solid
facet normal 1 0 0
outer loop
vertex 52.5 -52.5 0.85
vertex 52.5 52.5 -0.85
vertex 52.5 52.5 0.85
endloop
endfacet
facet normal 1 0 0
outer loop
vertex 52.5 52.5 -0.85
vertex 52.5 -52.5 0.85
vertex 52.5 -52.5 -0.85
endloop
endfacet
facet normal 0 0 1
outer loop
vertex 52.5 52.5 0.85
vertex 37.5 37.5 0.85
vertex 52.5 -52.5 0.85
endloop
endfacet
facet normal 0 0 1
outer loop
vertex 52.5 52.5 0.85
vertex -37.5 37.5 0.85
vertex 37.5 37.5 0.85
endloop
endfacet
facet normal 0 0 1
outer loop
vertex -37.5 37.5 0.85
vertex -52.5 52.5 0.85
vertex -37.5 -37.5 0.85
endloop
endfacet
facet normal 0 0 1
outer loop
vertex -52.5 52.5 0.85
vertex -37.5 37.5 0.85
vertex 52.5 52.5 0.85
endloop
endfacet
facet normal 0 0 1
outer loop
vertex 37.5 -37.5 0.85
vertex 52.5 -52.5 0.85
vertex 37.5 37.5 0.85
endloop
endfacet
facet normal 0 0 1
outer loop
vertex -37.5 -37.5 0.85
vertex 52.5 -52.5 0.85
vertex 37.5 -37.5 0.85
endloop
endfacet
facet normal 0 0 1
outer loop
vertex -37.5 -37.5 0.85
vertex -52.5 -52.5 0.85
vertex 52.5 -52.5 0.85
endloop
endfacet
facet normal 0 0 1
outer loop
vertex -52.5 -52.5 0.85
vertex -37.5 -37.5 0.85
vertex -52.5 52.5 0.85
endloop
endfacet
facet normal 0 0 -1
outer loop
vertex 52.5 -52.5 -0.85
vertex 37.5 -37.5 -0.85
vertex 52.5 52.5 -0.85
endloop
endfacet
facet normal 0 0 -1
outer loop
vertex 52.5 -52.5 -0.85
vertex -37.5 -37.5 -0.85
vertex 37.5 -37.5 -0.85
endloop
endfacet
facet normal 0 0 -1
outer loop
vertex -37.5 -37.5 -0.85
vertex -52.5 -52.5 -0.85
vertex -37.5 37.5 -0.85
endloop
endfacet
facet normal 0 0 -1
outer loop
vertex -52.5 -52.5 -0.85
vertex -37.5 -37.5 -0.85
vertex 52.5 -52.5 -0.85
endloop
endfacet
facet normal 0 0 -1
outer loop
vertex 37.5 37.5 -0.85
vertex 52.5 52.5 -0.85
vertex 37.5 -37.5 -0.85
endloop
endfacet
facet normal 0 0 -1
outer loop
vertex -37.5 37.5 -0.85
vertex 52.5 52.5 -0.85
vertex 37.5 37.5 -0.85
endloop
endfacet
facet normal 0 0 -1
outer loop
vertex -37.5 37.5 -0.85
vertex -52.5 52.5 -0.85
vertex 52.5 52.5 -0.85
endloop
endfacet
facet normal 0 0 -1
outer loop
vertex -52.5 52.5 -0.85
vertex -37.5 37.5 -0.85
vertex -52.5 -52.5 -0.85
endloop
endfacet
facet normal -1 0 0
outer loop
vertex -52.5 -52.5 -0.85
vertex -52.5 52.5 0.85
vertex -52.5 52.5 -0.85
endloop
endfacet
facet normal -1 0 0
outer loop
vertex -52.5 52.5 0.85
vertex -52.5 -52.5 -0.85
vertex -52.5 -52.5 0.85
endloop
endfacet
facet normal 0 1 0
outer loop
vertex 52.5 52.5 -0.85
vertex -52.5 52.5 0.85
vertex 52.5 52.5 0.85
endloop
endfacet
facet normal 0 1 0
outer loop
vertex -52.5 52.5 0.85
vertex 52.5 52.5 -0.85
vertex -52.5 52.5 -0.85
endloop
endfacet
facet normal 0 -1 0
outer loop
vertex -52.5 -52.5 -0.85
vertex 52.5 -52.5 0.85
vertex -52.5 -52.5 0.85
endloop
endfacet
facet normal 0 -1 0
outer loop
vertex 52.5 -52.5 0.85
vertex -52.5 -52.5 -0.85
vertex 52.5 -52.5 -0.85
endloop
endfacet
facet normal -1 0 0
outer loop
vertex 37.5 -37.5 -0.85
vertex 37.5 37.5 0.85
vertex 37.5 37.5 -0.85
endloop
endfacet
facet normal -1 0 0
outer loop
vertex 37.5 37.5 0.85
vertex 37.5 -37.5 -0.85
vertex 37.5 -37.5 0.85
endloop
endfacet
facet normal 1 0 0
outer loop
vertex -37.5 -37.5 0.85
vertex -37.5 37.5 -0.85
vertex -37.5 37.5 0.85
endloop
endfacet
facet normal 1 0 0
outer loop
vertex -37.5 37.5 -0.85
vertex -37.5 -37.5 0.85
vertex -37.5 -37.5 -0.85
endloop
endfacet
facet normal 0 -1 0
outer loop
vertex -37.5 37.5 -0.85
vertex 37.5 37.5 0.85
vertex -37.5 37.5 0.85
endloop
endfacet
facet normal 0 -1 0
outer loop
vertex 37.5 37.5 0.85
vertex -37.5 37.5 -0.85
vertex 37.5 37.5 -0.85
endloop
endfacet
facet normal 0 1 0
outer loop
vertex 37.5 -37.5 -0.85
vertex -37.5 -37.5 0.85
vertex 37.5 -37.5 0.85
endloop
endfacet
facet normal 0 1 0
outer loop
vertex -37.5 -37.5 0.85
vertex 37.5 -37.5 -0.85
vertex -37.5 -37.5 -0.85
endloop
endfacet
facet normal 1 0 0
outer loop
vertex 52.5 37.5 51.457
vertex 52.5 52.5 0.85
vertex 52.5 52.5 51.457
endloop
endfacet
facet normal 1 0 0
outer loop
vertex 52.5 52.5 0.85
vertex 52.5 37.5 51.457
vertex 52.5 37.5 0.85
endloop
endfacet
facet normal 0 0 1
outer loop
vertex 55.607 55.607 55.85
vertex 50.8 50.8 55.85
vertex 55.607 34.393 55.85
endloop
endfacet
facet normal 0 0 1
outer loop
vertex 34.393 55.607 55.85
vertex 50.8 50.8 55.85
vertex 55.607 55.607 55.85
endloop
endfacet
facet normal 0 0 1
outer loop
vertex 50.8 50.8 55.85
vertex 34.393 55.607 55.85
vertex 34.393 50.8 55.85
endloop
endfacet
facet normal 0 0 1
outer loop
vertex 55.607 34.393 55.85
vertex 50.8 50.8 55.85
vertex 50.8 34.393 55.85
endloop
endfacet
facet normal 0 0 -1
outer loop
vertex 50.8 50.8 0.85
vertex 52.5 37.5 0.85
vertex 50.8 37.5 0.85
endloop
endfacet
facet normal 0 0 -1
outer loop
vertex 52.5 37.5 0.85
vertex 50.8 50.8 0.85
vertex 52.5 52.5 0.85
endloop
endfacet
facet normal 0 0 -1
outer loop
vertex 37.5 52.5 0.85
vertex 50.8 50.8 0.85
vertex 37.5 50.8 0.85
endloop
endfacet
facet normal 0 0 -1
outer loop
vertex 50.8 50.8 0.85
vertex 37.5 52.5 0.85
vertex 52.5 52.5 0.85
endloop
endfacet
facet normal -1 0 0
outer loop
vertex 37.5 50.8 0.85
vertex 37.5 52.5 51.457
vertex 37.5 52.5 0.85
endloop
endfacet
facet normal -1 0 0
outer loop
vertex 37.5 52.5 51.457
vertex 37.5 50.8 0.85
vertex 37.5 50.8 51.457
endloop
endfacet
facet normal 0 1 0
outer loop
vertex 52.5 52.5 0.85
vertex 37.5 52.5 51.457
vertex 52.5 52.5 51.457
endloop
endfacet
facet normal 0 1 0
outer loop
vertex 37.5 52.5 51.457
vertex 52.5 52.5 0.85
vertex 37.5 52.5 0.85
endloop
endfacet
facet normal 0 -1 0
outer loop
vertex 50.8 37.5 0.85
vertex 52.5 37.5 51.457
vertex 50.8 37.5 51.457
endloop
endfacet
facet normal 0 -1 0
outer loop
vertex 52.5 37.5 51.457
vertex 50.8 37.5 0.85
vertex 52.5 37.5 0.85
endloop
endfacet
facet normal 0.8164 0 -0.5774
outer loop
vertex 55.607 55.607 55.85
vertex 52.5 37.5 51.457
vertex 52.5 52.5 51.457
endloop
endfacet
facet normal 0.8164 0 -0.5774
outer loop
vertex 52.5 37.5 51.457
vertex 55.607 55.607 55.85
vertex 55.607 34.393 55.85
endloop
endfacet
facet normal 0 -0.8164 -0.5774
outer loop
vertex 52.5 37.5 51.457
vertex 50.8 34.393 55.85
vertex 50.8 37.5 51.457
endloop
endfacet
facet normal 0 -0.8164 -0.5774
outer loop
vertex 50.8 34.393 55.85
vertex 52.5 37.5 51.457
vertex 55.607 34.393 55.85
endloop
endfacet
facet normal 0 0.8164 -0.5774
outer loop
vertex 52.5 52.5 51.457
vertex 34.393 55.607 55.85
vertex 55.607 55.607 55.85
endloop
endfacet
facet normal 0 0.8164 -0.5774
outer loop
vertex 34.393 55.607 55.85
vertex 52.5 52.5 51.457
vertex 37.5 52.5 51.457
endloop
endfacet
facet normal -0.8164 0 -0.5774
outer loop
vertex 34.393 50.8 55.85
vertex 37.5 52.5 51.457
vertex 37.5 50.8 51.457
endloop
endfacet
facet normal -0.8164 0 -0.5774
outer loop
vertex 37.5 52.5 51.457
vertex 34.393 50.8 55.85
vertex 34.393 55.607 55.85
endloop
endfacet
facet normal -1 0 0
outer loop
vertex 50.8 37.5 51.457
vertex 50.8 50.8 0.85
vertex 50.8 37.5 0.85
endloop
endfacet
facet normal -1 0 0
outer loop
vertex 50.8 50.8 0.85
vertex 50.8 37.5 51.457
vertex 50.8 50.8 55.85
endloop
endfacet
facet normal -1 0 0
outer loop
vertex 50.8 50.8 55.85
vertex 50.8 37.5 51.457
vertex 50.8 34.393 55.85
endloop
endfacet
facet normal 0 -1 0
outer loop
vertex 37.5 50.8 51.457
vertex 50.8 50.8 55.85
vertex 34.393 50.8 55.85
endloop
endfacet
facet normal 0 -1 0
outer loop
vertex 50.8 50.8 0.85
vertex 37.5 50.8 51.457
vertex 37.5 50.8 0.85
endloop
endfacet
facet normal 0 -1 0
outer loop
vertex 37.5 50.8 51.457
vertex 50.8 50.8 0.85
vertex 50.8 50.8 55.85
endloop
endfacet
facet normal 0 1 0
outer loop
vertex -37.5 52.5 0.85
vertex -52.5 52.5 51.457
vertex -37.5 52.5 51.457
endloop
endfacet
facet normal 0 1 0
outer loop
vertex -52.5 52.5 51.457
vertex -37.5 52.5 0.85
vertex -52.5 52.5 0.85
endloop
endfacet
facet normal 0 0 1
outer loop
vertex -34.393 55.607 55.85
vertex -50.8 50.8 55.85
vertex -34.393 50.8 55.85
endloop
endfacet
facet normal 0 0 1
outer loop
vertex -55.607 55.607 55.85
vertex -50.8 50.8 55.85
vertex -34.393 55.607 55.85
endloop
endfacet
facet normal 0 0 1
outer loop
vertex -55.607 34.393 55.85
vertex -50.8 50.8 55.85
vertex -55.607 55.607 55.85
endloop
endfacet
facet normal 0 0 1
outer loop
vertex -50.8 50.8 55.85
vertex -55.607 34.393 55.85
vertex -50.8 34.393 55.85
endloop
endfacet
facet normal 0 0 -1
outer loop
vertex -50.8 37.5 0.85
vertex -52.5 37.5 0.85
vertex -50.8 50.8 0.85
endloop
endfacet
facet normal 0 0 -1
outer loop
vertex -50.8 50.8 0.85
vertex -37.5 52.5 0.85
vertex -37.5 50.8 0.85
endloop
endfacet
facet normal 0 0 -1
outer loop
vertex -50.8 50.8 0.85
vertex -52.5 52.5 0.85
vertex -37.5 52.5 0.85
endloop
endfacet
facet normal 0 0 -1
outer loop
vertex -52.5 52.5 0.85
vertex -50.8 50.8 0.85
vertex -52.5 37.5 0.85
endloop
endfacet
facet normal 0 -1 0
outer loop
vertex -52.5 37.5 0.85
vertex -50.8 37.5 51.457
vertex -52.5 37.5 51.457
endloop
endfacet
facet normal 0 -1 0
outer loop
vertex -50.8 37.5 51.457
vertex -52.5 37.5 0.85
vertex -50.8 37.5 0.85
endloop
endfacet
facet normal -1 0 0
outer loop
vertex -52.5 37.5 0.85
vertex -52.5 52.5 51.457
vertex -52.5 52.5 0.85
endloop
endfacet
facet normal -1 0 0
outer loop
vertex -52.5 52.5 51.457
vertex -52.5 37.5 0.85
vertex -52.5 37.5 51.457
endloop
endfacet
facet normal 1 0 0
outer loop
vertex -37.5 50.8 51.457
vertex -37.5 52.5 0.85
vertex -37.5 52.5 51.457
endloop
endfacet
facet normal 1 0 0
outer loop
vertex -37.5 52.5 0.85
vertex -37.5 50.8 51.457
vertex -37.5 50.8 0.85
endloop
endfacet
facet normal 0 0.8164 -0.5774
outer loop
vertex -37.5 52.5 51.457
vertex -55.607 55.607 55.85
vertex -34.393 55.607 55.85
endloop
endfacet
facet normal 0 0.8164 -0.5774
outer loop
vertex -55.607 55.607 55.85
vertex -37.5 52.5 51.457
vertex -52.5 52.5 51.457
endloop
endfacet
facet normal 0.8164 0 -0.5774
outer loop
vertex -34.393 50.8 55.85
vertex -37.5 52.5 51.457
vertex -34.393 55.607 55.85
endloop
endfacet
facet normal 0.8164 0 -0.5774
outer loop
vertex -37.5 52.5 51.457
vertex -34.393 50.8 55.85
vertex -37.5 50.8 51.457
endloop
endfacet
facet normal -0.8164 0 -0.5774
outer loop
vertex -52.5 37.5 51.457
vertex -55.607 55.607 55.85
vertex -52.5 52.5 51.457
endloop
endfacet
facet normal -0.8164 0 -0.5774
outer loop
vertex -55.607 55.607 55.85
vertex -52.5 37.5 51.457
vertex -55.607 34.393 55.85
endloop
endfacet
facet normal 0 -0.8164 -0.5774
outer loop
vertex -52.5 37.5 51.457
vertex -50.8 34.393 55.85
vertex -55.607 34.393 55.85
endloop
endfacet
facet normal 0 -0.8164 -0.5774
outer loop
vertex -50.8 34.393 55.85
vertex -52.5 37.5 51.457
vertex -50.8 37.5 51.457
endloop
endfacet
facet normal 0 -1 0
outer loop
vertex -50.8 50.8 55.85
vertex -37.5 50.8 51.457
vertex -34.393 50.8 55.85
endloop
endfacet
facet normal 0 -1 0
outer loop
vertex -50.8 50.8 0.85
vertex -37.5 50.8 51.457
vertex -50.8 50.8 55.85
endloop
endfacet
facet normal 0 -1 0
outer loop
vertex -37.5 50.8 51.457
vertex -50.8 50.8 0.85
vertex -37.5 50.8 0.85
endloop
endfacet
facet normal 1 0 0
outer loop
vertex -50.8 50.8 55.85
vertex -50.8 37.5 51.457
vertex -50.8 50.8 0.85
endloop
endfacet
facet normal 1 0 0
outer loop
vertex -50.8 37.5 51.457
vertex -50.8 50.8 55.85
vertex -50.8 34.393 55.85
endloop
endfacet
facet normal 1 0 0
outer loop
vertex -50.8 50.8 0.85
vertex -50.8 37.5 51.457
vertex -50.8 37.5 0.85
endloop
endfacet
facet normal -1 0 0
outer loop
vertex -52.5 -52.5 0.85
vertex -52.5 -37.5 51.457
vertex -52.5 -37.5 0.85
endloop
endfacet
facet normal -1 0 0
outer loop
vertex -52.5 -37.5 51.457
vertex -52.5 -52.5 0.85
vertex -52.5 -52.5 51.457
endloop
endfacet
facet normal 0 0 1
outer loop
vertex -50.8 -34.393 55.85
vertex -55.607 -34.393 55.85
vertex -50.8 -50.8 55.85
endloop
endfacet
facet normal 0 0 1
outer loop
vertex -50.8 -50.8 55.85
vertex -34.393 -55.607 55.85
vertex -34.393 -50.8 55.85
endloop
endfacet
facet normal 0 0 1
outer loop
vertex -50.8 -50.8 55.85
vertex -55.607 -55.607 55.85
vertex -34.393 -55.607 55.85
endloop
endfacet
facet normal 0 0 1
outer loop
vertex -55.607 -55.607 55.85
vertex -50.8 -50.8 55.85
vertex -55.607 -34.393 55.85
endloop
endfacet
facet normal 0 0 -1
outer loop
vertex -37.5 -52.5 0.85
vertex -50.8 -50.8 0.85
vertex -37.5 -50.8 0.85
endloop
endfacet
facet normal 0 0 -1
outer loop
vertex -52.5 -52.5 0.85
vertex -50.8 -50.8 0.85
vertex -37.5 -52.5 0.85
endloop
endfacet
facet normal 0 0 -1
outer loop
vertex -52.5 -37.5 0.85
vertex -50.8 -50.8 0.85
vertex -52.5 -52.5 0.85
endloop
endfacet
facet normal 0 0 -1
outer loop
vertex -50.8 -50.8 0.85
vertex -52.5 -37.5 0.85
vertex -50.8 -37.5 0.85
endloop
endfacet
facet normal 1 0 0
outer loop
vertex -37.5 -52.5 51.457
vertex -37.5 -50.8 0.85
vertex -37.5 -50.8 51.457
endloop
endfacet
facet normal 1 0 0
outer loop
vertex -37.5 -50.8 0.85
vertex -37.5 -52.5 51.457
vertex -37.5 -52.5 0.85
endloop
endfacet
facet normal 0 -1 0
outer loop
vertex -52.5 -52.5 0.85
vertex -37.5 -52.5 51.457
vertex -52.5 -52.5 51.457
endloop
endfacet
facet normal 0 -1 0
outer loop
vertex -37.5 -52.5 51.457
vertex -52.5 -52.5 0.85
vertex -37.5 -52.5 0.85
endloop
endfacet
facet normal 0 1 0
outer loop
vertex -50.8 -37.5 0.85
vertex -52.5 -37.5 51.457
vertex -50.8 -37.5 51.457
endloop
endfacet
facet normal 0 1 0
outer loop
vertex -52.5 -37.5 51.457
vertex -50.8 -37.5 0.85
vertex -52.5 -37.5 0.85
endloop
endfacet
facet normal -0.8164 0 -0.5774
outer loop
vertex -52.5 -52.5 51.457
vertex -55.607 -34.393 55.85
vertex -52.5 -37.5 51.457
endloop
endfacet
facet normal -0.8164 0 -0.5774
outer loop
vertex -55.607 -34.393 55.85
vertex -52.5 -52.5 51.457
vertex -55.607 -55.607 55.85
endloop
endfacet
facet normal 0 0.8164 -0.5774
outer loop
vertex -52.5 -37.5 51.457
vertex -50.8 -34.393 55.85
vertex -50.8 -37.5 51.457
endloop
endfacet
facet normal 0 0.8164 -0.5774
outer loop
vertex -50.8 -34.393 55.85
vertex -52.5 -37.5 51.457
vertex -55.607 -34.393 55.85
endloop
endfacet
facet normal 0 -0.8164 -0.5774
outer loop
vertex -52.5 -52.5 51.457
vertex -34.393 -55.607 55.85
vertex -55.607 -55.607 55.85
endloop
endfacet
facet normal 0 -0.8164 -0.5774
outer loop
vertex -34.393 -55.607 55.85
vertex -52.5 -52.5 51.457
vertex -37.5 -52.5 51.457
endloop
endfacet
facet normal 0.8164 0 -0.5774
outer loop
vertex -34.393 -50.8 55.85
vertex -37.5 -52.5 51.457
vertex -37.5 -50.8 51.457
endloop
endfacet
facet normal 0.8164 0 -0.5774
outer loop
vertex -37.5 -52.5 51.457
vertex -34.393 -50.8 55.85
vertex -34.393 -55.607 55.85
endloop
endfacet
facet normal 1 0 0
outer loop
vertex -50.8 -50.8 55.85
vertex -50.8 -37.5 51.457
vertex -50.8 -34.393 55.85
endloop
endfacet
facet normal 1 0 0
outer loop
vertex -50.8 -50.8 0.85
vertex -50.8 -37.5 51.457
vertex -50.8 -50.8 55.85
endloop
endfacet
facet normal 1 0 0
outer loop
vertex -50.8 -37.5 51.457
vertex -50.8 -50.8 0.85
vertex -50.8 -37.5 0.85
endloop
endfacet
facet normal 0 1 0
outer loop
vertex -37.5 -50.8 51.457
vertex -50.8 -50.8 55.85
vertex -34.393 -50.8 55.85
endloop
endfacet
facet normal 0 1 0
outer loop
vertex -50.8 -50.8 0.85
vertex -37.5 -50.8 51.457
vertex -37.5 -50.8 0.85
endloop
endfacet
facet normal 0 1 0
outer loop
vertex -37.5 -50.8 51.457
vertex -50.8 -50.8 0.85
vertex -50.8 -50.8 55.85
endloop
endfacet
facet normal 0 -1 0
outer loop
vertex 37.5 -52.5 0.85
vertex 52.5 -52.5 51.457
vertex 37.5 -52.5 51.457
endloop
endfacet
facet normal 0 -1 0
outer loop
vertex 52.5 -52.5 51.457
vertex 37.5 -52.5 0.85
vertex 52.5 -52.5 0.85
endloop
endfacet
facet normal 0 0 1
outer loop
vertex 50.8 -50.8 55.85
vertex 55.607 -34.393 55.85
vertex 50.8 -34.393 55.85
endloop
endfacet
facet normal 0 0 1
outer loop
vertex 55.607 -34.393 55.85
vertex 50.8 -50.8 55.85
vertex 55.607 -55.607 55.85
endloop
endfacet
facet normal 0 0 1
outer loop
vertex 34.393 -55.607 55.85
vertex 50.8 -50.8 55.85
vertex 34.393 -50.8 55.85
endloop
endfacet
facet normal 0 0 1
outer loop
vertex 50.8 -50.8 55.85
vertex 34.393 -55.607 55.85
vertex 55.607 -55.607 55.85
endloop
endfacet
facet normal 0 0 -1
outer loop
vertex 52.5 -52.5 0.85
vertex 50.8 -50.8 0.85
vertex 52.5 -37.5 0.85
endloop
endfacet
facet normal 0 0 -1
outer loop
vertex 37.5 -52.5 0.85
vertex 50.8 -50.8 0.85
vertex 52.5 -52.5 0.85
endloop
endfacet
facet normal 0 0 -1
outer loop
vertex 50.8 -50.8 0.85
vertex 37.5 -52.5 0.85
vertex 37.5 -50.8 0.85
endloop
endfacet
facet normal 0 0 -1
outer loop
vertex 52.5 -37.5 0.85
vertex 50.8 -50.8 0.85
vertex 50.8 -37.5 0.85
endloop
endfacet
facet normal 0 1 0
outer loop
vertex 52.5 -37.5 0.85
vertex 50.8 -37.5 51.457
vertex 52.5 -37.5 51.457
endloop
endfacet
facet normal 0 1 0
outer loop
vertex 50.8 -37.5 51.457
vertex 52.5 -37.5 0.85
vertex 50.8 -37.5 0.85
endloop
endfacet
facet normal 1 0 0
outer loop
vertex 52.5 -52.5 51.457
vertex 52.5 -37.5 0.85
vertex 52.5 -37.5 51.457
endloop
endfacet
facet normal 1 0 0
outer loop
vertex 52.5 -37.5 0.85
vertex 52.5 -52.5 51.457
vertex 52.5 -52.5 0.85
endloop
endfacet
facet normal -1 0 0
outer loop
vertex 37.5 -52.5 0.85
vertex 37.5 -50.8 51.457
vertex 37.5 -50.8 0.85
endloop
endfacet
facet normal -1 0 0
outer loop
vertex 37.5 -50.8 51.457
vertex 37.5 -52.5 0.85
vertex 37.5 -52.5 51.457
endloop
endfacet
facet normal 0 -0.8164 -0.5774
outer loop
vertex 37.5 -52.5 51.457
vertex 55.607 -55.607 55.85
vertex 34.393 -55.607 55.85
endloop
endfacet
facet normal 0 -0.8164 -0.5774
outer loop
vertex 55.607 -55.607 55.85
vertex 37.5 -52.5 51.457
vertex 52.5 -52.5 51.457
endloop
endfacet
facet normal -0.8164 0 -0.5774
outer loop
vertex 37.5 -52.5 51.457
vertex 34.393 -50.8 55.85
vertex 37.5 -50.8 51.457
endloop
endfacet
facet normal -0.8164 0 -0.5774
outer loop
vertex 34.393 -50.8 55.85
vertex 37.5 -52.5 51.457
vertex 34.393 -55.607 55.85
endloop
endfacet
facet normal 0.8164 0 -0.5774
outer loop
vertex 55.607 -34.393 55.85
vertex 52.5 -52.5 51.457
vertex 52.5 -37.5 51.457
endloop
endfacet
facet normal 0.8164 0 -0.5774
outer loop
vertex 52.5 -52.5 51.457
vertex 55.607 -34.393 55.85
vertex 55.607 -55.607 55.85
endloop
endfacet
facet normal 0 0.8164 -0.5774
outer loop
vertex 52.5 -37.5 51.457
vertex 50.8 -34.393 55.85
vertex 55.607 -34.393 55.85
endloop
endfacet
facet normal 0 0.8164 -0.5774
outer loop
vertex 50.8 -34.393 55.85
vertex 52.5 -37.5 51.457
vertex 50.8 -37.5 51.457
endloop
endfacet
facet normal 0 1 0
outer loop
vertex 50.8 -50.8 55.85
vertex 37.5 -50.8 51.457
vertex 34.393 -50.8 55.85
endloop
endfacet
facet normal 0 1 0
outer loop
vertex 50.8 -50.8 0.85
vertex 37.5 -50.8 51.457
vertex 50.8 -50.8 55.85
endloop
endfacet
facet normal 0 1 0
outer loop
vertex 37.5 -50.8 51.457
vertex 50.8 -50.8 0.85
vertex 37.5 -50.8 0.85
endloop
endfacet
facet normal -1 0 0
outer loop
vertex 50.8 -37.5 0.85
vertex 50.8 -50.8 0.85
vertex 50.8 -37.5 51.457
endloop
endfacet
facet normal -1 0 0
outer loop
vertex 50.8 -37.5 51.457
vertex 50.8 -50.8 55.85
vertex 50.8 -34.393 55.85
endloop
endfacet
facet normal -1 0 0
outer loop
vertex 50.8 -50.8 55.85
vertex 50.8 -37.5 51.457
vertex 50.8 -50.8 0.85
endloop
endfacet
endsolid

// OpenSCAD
wall_thickness = 1.7;

inner_diameter = 75;
outer_lip_thickness = 15;
leg_height = 55;

module top()
{
    difference() {
        cube([inner_diameter + outer_lip_thickness * 2, inner_diameter + outer_lip_thickness*2, wall_thickness],center=true);
        cube([inner_diameter, inner_diameter, wall_thickness],center=true);
    }
}

module leg() {
    difference() {
        union() {
            cube([outer_lip_thickness, outer_lip_thickness, leg_height]);
            translate([outer_lip_thickness/2, outer_lip_thickness/2, leg_height-outer_lip_thickness/2])
                rotate([180, 0, 45])
                cylinder(outer_lip_thickness,outer_lip_thickness,0,$fn=4,center=true);
        }
        union() {
            cube([outer_lip_thickness-wall_thickness, outer_lip_thickness-wall_thickness, leg_height]);
            translate([-outer_lip_thickness/2, -outer_lip_thickness/2, 0])
                cube([outer_lip_thickness-wall_thickness+outer_lip_thickness/2, outer_lip_thickness-wall_thickness+outer_lip_thickness/2, leg_height]);
        }
    }
}

module legs() {
    translate([inner_diameter/2, inner_diameter/2, wall_thickness/2])
        leg();
    translate([-inner_diameter/2, inner_diameter/2, wall_thickness/2])
        rotate([0, 0, 90])
        leg();
    translate([-inner_diameter/2, -inner_diameter/2, wall_thickness/2])
        rotate([0, 0, 180])
        leg();
    translate([inner_diameter/2, -inner_diameter/2, wall_thickness/2])
        rotate([0, 0, 270])
        leg();
}

top();
legs();
